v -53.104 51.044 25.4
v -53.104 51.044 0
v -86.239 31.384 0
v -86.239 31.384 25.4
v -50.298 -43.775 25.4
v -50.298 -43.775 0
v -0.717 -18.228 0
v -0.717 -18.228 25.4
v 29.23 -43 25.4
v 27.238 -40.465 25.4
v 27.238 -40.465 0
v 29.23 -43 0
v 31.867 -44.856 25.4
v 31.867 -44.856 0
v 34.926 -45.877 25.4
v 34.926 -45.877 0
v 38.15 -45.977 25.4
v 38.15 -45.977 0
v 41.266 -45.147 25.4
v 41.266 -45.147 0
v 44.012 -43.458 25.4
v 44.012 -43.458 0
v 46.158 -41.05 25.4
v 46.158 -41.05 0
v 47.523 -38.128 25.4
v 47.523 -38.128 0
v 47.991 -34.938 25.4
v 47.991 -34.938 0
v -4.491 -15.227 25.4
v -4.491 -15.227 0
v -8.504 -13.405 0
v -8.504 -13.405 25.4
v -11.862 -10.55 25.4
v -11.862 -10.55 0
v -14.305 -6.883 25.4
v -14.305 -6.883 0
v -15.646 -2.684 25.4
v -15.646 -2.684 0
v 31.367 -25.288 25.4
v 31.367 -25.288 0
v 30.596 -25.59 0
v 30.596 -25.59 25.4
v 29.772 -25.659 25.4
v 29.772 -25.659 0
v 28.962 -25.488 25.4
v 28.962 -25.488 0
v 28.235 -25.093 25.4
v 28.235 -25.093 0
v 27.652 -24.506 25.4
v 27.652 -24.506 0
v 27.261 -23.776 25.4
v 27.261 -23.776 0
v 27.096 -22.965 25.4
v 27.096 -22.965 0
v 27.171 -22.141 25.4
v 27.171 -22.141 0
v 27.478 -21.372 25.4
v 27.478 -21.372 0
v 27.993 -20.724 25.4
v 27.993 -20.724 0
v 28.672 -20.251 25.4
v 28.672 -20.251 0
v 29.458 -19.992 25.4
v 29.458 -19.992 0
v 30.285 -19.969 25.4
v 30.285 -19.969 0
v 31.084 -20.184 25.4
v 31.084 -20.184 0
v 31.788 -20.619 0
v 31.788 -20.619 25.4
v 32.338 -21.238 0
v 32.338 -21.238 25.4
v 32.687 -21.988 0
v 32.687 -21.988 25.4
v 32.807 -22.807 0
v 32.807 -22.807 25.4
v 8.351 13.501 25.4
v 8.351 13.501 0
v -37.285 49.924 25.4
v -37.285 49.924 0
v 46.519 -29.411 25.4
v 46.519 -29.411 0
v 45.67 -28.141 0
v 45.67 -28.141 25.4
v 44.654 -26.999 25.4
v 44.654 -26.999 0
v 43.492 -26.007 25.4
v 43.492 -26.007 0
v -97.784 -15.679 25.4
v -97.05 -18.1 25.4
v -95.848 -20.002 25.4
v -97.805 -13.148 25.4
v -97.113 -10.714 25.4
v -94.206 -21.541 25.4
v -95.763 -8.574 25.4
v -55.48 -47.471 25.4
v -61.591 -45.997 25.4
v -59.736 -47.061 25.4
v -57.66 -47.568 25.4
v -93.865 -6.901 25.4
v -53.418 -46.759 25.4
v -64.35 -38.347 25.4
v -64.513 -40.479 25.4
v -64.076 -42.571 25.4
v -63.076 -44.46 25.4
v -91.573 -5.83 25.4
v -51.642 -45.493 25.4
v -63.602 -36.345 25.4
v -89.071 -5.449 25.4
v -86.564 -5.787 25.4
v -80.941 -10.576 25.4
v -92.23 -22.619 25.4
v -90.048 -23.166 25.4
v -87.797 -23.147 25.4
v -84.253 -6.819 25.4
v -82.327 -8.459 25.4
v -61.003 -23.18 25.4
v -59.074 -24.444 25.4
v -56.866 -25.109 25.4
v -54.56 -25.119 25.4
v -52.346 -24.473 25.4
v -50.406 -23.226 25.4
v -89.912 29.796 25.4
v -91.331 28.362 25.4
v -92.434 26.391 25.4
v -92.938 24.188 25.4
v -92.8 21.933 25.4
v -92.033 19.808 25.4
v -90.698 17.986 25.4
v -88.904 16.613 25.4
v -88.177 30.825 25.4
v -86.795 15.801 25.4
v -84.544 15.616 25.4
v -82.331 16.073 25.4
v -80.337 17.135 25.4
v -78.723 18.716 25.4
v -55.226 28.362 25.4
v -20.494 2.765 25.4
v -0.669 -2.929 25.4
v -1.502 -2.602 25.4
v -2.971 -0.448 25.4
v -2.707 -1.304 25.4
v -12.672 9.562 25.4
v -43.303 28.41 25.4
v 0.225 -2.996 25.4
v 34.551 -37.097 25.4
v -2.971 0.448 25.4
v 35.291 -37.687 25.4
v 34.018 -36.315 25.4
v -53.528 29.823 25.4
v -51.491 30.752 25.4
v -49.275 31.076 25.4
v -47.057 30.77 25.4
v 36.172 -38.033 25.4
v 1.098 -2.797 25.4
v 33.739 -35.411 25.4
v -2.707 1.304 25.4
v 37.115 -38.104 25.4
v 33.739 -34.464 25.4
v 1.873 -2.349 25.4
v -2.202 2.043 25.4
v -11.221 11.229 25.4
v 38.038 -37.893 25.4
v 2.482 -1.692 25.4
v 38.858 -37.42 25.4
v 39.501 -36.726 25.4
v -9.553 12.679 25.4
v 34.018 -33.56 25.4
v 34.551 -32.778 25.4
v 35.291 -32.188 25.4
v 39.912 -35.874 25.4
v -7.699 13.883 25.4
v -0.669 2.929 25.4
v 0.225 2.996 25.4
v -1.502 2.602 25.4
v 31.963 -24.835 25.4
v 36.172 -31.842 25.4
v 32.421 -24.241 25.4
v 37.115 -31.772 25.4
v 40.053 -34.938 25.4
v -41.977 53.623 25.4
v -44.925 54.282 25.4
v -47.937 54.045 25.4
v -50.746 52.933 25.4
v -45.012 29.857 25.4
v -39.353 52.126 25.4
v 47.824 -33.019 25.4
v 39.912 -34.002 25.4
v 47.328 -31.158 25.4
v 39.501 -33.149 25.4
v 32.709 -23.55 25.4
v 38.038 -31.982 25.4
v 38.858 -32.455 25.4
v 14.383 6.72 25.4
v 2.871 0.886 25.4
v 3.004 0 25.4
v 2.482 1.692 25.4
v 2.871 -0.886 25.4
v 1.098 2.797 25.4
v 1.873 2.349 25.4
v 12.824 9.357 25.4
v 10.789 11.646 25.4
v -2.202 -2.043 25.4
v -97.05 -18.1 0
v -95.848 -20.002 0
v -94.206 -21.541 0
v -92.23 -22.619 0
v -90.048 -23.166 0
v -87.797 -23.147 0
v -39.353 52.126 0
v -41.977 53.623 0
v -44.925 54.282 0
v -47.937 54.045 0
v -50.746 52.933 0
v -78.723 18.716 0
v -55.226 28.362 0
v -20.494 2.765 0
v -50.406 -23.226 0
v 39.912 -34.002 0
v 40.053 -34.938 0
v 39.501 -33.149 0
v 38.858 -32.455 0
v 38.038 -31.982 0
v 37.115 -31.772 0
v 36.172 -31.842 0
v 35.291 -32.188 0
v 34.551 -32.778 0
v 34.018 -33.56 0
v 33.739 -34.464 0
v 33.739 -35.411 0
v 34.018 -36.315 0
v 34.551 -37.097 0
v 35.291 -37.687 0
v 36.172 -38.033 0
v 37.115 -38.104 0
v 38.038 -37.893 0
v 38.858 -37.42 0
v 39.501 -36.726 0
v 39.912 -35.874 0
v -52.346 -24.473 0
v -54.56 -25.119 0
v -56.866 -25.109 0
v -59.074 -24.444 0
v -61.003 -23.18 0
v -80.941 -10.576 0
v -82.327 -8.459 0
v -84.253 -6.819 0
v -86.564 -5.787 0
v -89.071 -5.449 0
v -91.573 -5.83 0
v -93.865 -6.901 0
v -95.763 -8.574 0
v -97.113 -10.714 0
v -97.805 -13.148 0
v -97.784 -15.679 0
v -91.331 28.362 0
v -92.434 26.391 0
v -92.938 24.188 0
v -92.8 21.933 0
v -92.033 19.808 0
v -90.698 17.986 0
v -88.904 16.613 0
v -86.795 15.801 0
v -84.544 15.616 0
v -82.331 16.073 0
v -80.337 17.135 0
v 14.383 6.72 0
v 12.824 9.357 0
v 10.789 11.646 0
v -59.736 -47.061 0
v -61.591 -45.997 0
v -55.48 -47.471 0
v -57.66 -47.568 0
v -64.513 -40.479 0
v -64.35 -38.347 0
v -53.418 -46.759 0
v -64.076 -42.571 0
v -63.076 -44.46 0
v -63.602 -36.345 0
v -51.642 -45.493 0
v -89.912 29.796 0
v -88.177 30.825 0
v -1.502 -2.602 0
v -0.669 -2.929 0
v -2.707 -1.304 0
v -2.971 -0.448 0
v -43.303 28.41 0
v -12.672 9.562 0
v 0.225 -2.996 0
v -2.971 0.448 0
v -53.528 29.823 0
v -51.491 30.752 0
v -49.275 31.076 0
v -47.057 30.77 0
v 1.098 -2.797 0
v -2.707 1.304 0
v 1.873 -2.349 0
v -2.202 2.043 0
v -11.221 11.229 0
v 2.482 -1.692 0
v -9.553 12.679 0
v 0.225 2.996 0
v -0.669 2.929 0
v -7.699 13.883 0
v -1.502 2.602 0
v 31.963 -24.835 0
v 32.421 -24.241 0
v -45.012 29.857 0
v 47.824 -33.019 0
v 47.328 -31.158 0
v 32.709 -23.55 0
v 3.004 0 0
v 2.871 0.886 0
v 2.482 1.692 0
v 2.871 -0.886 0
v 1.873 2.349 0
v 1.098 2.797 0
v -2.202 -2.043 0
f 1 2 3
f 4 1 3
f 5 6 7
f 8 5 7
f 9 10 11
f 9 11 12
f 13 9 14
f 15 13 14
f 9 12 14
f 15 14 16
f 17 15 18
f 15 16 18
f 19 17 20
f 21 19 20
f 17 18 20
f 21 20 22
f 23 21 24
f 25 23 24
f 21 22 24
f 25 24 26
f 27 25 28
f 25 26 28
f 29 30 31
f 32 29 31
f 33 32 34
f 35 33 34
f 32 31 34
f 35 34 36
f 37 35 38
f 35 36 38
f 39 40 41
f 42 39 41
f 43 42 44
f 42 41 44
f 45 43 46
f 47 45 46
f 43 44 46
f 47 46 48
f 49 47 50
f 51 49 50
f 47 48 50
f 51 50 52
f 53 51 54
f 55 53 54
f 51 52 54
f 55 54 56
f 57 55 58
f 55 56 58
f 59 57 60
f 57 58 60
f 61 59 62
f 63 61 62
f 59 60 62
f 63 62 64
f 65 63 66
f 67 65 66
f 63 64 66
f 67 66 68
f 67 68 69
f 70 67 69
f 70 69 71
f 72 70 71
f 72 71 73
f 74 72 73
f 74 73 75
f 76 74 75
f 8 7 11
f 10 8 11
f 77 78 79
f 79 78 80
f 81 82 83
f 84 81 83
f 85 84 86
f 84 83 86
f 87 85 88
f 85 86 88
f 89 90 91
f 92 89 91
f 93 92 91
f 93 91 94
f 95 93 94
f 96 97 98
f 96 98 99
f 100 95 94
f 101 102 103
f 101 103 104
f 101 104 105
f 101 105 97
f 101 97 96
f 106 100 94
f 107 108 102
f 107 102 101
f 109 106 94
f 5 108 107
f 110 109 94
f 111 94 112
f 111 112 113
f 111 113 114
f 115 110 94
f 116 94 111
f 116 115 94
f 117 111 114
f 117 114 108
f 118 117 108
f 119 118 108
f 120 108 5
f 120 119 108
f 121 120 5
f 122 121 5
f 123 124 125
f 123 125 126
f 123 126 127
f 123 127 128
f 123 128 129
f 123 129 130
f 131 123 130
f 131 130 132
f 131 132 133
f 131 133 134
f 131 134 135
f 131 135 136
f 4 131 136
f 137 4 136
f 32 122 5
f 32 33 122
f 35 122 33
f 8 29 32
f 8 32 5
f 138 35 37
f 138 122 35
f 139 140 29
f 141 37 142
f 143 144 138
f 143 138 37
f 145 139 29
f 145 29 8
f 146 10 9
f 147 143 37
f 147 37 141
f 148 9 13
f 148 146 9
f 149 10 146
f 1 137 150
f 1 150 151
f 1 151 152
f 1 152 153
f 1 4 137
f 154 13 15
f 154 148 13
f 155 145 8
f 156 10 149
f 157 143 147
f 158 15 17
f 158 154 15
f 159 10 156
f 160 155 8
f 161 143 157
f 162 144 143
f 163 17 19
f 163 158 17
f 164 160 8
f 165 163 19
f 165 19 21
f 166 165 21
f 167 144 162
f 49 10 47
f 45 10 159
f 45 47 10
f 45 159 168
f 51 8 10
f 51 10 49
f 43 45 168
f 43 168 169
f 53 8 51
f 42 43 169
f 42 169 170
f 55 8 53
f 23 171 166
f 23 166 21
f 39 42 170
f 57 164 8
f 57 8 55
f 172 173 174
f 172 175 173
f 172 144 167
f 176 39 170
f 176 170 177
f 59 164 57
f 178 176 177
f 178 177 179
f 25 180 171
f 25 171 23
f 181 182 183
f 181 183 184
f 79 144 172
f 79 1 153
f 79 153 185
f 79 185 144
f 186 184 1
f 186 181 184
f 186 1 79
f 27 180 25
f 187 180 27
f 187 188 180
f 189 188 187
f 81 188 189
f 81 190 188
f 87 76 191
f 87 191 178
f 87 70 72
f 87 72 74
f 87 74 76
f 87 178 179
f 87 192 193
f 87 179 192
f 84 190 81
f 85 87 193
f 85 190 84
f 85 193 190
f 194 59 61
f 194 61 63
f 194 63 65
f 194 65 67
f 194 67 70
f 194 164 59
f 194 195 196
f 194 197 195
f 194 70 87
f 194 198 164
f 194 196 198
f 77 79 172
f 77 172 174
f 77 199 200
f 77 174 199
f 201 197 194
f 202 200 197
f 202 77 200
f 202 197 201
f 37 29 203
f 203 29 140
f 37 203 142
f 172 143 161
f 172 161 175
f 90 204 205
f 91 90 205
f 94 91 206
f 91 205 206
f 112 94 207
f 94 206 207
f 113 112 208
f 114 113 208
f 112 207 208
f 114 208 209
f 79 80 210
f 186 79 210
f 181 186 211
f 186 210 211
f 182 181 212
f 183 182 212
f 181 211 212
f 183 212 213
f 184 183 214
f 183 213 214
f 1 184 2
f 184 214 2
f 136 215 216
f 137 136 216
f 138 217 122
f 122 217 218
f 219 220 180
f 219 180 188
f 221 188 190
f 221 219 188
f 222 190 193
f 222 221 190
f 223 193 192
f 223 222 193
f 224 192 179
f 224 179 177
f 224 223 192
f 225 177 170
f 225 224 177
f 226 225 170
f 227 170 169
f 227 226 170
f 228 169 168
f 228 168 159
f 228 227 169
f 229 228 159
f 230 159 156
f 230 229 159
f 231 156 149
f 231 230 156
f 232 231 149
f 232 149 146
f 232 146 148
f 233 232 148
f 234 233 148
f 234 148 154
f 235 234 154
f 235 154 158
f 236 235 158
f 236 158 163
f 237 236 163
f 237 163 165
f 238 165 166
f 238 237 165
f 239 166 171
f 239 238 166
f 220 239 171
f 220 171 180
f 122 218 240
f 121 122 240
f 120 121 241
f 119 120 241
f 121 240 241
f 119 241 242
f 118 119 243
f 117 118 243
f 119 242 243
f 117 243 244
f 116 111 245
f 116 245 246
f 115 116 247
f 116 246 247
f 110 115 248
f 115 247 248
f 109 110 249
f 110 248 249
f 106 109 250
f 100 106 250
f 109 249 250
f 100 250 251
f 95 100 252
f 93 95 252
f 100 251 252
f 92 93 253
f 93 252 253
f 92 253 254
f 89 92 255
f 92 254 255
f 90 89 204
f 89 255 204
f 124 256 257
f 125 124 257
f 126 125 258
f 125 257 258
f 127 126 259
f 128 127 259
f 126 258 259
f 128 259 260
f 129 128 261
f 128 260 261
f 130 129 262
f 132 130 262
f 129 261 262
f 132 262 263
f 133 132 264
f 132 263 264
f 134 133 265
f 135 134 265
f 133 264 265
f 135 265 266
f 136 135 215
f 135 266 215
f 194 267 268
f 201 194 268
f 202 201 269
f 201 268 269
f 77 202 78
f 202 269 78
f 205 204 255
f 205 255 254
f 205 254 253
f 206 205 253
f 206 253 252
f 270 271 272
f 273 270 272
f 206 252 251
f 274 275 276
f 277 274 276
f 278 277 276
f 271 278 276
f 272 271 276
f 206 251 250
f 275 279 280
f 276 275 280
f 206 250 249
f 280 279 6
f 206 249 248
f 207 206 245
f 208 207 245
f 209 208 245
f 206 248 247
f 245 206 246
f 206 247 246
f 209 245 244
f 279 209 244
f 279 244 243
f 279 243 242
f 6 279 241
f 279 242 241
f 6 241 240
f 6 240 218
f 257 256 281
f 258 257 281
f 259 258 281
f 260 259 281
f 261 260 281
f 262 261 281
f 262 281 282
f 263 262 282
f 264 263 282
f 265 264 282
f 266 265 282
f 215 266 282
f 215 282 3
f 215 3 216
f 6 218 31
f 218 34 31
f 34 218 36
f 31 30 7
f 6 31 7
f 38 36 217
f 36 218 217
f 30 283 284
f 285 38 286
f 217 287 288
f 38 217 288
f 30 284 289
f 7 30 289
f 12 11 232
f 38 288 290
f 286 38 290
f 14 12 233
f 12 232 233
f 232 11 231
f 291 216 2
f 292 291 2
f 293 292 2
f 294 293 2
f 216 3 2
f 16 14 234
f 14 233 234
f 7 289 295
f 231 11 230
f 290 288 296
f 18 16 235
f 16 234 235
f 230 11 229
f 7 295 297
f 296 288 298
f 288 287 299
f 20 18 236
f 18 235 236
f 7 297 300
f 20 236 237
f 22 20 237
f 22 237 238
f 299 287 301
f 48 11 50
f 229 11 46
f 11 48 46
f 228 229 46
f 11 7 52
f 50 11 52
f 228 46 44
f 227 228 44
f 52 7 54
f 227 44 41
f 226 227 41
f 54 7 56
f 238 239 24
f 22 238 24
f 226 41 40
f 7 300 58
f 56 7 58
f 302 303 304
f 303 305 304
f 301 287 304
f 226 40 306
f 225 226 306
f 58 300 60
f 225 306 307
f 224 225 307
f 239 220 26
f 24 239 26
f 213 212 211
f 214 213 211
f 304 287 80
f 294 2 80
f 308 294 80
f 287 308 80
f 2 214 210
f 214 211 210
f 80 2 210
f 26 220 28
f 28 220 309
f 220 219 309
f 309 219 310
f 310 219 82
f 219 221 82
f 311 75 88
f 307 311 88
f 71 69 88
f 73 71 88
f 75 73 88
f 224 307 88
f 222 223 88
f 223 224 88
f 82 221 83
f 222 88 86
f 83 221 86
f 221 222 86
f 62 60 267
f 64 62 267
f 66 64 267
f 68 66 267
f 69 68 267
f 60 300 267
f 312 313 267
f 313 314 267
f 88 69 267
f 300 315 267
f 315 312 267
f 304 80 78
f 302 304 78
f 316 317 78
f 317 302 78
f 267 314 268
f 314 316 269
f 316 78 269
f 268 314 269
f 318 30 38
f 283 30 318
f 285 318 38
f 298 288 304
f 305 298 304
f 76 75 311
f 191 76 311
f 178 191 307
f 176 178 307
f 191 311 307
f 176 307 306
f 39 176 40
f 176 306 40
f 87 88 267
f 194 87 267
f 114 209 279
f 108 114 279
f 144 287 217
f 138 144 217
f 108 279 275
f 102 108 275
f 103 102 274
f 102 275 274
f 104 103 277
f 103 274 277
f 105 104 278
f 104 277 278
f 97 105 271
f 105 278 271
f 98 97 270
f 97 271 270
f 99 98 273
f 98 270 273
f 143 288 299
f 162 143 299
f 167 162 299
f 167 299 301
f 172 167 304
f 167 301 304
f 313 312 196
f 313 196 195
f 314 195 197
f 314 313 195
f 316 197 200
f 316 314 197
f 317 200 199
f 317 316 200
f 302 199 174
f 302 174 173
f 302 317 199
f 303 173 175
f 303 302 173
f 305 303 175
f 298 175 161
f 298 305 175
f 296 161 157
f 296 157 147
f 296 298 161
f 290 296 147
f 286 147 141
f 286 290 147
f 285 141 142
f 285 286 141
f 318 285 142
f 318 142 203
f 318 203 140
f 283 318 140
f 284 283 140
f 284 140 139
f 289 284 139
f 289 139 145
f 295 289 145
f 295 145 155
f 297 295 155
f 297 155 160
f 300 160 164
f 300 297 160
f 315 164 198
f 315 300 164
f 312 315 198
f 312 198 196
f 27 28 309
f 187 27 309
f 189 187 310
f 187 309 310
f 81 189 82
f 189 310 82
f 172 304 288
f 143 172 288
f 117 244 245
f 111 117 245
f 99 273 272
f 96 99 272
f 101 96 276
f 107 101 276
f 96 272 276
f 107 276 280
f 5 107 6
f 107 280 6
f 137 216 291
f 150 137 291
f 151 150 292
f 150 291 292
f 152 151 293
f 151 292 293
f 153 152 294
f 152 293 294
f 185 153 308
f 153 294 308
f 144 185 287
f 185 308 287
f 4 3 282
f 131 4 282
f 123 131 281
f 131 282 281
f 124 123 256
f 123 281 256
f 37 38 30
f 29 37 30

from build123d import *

# Parameters (mm, degrees)
F0_R     = 3.0043710318
F0_R_2   = 3.175
F1_DEPTH = 25.4


with BuildPart() as f1:
    # F0 (on Top) → F1 (new body)
    with BuildSketch(Plane.XY):
        with BuildLine():
            Line((14.3825741705, 6.7199096146), (8.3514579782, 13.5006953391))
            ThreePointArc((8.3514579782, 13.5006953391), (0.3779775203, 15.8704996139), (-7.6992788751, 13.8829654542))
            Line((-7.6992788751, 13.8829654542), (-12.6724380842, 9.5616388764))
            ThreePointArc((-12.6724380842, 9.5616388764), (-15.4266258064, 3.7463103487), (-15.6463763052, -2.6844987459))
            Line((-15.6463763052, -2.6844987459), (-4.4909803426, -15.2265137363))
            ThreePointArc((-4.4909803426, -15.2265137363), (1.497725163, -15.8041907207), (7.271304677, -14.1118302603))
            ThreePointArc((7.271304677, -14.1118302603), (13.5544750313, -8.2638871983), (15.875, 0))
            ThreePointArc((15.875, 0), (15.4974028462, 3.4418207422), (14.3825741705, 6.7199096146))
        make_face()
        Circle(F0_R, mode=Mode.SUBTRACT)
        with BuildLine():
            ThreePointArc((14.3825741705, 6.7199096146), (11.861864027, 10.5504410716), (8.3514579782, 13.5006953391))
            Line((8.3514579782, 13.5006953391), (14.3825741705, 6.7199096146))
        make_face()
        with BuildLine():
            ThreePointArc((-7.6992788751, 13.8829654542), (0.3779775203, 15.8704996139), (8.3514579782, 13.5006953391))
            Line((8.3514579782, 13.5006953391), (-37.2847150373, 49.9237820037))
            ThreePointArc((-37.2847150373, 49.9237820037), (-35.9437438836, 47.1727971434), (-35.4828127154, 44.1472949049))
            ThreePointArc((-35.4828127154, 44.1472949049), (-49.345849391, 34.6861575854), (-53.1035055067, 51.0439363394))
            Line((-53.1035055067, 51.0439363394), (-86.2388696466, 31.3836151645))
            ThreePointArc((-86.2388696466, 31.3836151645), (-79.8604900877, 29.5651165544), (-77.0894247023, 23.5391842927))
            ThreePointArc((-77.0894247023, 23.5391842927), (-77.5088532877, 20.9931072211), (-78.7228126593, 18.7161066861))
            Line((-78.7228126593, 18.7161066861), (-55.225755618, 28.3622618994))
            ThreePointArc((-55.225755618, 28.3622618994), (-49.2750868032, 31.076284), (-43.3029614193, 28.4098081034))
            Line((-43.3029614193, 28.4098081034), (-20.493781308, 2.765440137))
            Line((-20.493781308, 2.765440137), (-12.6724380842, 9.5616388764))
            ThreePointArc((-12.6724380842, 9.5616388764), (-10.4125010836, 11.9831317352), (-7.6992788751, 13.8829654542))
        make_face()
        with BuildLine():
            Line((43.4916438779, -26.0074260938), (14.3825741705, 6.7199096146))
            ThreePointArc((14.3825741705, 6.7199096146), (15.4974028462, 3.4418207422), (15.875, 0))
            ThreePointArc((15.875, 0), (13.5544750313, -8.2638871983), (7.271304677, -14.1118302603))
            Line((7.271304677, -14.1118302603), (-0.7174318046, -18.2281309718))
            Line((-0.7174318046, -18.2281309718), (27.2375291318, -40.4645198026))
            ThreePointArc((27.2375291318, -40.4645198026), (26.1554745178, -32.0201927375), (31.3667877085, -25.2882007145))
            ThreePointArc((31.3667877085, -25.2882007145), (37.5361745414, -23.8446798187), (43.4916438779, -26.0074260938))
        make_face()
        with BuildLine():
            ThreePointArc((32.8070785075, -22.8069058246), (32.4209123116, -24.2414146182), (31.3667877085, -25.2882007145))
            ThreePointArc((31.3667877085, -25.2882007145), (27.4782447035, -21.3723970309), (32.8070785075, -22.8069058246))
        make_face(mode=Mode.SUBTRACT)
        with BuildLine():
            ThreePointArc((-35.4828127154, 44.1472949049), (-35.9437438836, 47.1727971434), (-37.2847150373, 49.9237820037))
            ThreePointArc((-37.2847150373, 49.9237820037), (-44.9251635555, 54.2819177239), (-53.1035055067, 51.0439363394))
            ThreePointArc((-53.1035055067, 51.0439363394), (-49.345849391, 34.6861575854), (-35.4828127154, 44.1472949049))
        make_face()
        with BuildLine():
            ThreePointArc((-15.6463763052, -2.6844987459), (-15.4266258064, 3.7463103487), (-12.6724380842, 9.5616388764))
            Line((-12.6724380842, 9.5616388764), (-20.493781308, 2.765440137))
            Line((-20.493781308, 2.765440137), (-15.6463763052, -2.6844987459))
        make_face()
        with BuildLine():
            ThreePointArc((46.5187849108, -29.4108416552), (45.1814618402, -27.5523719788), (43.4916438779, -26.0074260938))
            Line((43.4916438779, -26.0074260938), (46.5187849108, -29.4108416552))
        make_face()
        with BuildLine():
            Line((46.5187849108, -29.4108416552), (43.4916438779, -26.0074260938))
            ThreePointArc((43.4916438779, -26.0074260938), (37.5361745414, -23.8446798187), (31.3667877085, -25.2882007145))
            ThreePointArc((31.3667877085, -25.2882007145), (26.1554745178, -32.0201927375), (27.2375291318, -40.4645198026))
            ThreePointArc((27.2375291318, -40.4645198026), (39.7378929207, -45.6759099514), (47.9906570213, -34.9376807289))
            ThreePointArc((47.9906570213, -34.9376807289), (47.6163862438, -32.0779448295), (46.5187849108, -29.4108416552))
        make_face()
        with Locations((36.8781570213, -34.9376807289)):
            Circle(F0_R_2, mode=Mode.SUBTRACT)
        with BuildLine():
            ThreePointArc((-4.4909803426, -15.2265137363), (-11.861864027, -10.5504410716), (-15.6463763052, -2.6844987459))
            Line((-15.6463763052, -2.6844987459), (-20.493781308, 2.765440137))
            Line((-20.493781308, 2.765440137), (-50.4060203438, -23.2261977966))
            ThreePointArc((-50.4060203438, -23.2261977966), (-55.7132555315, -25.1967300425), (-61.0031443147, -23.1800943961))
            Line((-61.0031443147, -23.1800943961), (-80.9405468136, -10.5763001971))
            ThreePointArc((-80.9405468136, -10.5763001971), (-80.316653673, -12.4114845417), (-80.1053407242, -14.3382671104))
            ThreePointArc((-80.1053407242, -14.3382671104), (-82.2990043641, -20.1855895191), (-87.7973945716, -23.1471844681))
            Line((-87.7973945716, -23.1471844681), (-63.6023153113, -36.3445038774))
            ThreePointArc((-63.6023153113, -36.3445038774), (-55.0299997662, -32.6007067871), (-49.2884898937, -39.9855341271))
            ThreePointArc((-49.2884898937, -39.9855341271), (-49.5450658668, -41.9462448655), (-50.2975152479, -43.7749159016))
            Line((-50.2975152479, -43.7749159016), (-0.7174318046, -18.2281309718))
            Line((-0.7174318046, -18.2281309718), (-4.4909803426, -15.2265137363))
        make_face()
        with BuildLine():
            Line((-0.7174318046, -18.2281309718), (7.271304677, -14.1118302603))
            ThreePointArc((7.271304677, -14.1118302603), (1.497725163, -15.8041907207), (-4.4909803426, -15.2265137363))
            Line((-4.4909803426, -15.2265137363), (-0.7174318046, -18.2281309718))
        make_face()
        with BuildLine():
            ThreePointArc((-77.0894247023, 23.5391842927), (-79.8604900877, 29.5651165544), (-86.2388696466, 31.3836151645))
            Line((-86.2388696466, 31.3836151645), (-91.3310367453, 28.3622618994))
            ThreePointArc((-91.3310367453, 28.3622618994), (-89.8500023089, 17.2350722497), (-78.7228126593, 18.7161066861))
            ThreePointArc((-78.7228126593, 18.7161066861), (-77.5088532877, 20.9931072211), (-77.0894247023, 23.5391842927))
        make_face()
        with BuildLine():
            Line((-91.3310367453, 28.3622618994), (-86.2388696466, 31.3836151645))
            ThreePointArc((-86.2388696466, 31.3836151645), (-89.0772237094, 30.3655291567), (-91.3310367453, 28.3622618994))
        make_face()
        with BuildLine():
            ThreePointArc((-57.6597608948, -47.5684090359), (-53.4182636488, -46.759212652), (-50.2975152479, -43.7749159016))
            Line((-50.2975152479, -43.7749159016), (-57.6597608948, -47.5684090359))
        make_face()
        with BuildLine():
            Line((-57.6597608948, -47.5684090359), (-50.2975152479, -43.7749159016))
            ThreePointArc((-50.2975152479, -43.7749159016), (-49.5450658668, -41.9462448655), (-49.2884898937, -39.9855341271))
            ThreePointArc((-49.2884898937, -39.9855341271), (-55.0299997662, -32.6007067871), (-63.6023153113, -36.3445038774))
            ThreePointArc((-63.6023153113, -36.3445038774), (-63.6428329888, -43.5510667769), (-57.6597608948, -47.5684090359))
        make_face()
        with BuildLine():
            ThreePointArc((-80.1053407242, -14.3382671104), (-80.316653673, -12.4114845417), (-80.9405468136, -10.5763001971))
            ThreePointArc((-80.9405468136, -10.5763001971), (-92.7573076375, -6.2834731997), (-97.0501346349, -18.1002340237))
            Line((-97.0501346349, -18.1002340237), (-87.7973945716, -23.1471844681))
            ThreePointArc((-87.7973945716, -23.1471844681), (-82.2990043641, -20.1855895191), (-80.1053407242, -14.3382671104))
        make_face()
        with BuildLine():
            Line((-87.7973945716, -23.1471844681), (-97.0501346349, -18.1002340237))
            ThreePointArc((-97.0501346349, -18.1002340237), (-93.2523370234, -22.1427582859), (-87.7973945716, -23.1471844681))
        make_face()
    extrude(amount=F1_DEPTH)


solid = f1.part
